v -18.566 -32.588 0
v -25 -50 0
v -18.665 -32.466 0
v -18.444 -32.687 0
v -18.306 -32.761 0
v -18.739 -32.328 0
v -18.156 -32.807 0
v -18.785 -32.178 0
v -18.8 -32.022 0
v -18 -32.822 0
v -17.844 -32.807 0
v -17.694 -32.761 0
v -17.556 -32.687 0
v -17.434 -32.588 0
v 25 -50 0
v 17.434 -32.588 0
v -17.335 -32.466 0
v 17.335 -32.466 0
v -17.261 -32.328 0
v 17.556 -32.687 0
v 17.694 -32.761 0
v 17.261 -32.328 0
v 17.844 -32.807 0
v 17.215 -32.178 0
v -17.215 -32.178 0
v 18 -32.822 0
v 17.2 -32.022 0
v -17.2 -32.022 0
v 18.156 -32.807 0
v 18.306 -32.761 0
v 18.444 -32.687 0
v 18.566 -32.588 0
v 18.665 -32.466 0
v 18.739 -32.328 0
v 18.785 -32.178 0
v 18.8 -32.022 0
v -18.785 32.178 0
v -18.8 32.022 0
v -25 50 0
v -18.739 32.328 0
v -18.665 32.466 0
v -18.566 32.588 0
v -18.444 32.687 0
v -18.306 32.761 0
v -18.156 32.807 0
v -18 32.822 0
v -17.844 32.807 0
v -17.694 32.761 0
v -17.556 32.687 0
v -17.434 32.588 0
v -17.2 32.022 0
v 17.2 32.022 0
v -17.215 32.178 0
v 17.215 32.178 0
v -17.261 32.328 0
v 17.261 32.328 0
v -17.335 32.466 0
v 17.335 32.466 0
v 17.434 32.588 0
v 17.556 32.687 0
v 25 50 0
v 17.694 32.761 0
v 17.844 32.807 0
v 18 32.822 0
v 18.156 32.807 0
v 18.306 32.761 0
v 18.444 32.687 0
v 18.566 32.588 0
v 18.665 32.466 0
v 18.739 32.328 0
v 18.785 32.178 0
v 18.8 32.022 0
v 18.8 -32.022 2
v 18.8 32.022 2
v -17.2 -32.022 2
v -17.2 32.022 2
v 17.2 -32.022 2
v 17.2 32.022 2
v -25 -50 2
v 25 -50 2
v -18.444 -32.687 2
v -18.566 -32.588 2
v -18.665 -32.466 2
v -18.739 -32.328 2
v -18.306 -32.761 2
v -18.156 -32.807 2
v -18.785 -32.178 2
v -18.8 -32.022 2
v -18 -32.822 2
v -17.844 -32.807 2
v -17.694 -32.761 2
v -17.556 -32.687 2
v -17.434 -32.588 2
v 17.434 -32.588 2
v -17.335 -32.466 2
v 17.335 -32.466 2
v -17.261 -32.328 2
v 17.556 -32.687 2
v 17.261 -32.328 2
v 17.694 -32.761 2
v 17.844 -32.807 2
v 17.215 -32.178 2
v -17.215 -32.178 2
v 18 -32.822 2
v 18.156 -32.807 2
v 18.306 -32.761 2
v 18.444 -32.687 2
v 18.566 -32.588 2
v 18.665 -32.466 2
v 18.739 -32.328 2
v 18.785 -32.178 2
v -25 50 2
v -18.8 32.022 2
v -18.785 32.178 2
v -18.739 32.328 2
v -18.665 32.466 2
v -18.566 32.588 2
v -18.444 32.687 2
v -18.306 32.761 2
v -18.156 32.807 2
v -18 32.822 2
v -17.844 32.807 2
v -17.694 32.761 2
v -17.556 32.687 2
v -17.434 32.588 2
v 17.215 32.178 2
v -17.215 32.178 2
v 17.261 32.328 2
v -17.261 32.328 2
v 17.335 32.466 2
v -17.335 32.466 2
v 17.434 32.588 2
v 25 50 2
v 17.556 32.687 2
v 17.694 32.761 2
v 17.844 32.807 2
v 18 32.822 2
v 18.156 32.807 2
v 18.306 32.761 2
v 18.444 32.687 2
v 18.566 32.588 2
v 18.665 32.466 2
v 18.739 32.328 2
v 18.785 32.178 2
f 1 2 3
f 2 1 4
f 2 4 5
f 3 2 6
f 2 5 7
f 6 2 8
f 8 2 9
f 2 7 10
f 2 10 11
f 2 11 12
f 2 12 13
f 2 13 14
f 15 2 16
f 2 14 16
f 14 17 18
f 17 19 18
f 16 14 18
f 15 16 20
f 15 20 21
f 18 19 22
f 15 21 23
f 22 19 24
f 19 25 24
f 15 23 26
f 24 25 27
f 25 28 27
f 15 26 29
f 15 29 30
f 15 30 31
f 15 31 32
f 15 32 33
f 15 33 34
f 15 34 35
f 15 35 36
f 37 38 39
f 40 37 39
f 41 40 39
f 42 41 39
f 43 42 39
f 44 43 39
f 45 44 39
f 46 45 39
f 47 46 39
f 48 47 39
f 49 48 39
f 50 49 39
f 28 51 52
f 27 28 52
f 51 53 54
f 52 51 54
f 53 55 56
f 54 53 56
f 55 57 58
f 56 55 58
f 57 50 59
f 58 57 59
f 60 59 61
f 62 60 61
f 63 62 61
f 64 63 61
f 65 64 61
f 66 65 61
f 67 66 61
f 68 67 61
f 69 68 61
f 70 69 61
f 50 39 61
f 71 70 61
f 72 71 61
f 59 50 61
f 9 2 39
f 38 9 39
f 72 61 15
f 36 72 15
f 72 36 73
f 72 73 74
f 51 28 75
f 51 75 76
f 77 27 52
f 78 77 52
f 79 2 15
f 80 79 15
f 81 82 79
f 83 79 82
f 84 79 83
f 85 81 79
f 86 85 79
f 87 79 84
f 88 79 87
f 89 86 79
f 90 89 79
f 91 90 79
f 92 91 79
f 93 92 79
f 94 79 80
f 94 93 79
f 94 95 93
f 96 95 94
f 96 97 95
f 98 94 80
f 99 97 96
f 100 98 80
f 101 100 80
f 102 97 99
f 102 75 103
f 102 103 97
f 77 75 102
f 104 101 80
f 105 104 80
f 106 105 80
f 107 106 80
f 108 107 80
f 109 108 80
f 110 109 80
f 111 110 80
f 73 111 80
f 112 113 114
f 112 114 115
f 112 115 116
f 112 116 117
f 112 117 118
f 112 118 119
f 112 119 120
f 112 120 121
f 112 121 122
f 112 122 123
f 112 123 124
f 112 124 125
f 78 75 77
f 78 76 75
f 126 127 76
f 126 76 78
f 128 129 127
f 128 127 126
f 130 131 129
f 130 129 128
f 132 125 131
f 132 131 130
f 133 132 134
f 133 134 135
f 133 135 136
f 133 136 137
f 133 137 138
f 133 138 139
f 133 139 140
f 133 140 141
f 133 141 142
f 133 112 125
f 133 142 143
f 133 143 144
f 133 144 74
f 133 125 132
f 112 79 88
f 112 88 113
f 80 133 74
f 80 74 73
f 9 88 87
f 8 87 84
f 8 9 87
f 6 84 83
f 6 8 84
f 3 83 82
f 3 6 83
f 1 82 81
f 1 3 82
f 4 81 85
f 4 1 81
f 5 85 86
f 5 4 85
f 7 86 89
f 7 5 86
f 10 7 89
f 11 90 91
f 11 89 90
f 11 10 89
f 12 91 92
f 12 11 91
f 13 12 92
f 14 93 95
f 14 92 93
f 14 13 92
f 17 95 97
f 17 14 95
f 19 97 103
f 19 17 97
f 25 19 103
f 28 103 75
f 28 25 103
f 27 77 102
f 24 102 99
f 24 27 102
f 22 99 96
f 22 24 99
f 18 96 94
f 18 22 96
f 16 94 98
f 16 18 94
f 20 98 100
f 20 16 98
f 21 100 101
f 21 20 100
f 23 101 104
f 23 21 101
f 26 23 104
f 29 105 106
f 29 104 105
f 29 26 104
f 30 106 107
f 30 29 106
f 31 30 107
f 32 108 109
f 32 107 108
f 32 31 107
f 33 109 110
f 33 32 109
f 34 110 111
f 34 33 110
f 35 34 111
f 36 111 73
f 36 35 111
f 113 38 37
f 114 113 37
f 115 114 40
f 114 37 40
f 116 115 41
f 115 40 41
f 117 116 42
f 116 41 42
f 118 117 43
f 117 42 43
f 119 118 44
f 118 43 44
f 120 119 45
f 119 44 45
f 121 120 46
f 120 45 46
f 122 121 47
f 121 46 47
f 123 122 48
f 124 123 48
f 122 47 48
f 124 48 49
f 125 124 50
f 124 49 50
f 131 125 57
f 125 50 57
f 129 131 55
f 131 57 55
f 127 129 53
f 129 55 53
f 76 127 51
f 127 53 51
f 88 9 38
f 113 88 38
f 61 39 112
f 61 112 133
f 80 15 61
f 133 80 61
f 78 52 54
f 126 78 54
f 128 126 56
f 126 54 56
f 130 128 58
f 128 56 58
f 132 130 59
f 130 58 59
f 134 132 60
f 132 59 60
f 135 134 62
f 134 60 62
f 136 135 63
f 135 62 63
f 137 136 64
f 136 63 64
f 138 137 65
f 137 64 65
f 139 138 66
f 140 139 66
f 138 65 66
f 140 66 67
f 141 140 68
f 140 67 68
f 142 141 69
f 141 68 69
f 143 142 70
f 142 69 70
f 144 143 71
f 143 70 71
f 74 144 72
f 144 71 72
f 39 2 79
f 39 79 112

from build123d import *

# Parameters (mm, degrees)
SKETCH1_W            = 50
SKETCH1_H            = 100
BOSS_EXTRUDE1_DEPTH  = 2
CUT_EXTRUDE1_DEPTH   = 56.937465084
LPATTERN1_COUNT      = 2
LPATTERN1_PITCH      = 36
MIRROR1_COPY_1_DEPTH = 56.937465084


with BuildPart() as part:
    # Sketch1 → Boss-Extrude1 (new body)
    with BuildSketch(Plane.XY):
        Rectangle(SKETCH1_W, SKETCH1_H)
    extrude(amount=BOSS_EXTRUDE1_DEPTH)

    # Sketch2 → Cut-Extrude1 (cut, through all)
    with BuildSketch(Plane(origin=(0, 0, 0), x_dir=(-1, 0, 0), z_dir=(0, 0, -1))):
        with BuildLine():
            Line((-18.8, 0), (-17.2, 0))
            Line((-17.2, 0), (-17.2, 32.021950636))
            ThreePointArc((-17.2, 32.021950636), (-18, 32.821950636), (-18.8, 32.021950636))
            Line((-18.8, 32.021950636), (-18.8, 0))
        make_face()
    cut_extrude1 = extrude(amount=-CUT_EXTRUDE1_DEPTH, mode=Mode.SUBTRACT)

    # LPattern1: Cut-Extrude1 ×2
    with Locations(*[(-i * LPATTERN1_PITCH, 0, 0) for i in range(1, LPATTERN1_COUNT)]):
        add(cut_extrude1, mode=Mode.SUBTRACT)

    # Mirror1: Cut-Extrude1 across plane
    add(cut_extrude1.mirror(Plane.ZX), mode=Mode.SUBTRACT)

    # Mirror1 copy 1 sketch → Mirror1 copy 1 (cut, through all)
    with BuildSketch(Plane(origin=(-36, 0, 0), x_dir=(-1, 0, 0), z_dir=(0, 0, -1))):
        with BuildLine():
            Line((-18.8, 0), (-17.2, 0))
            Line((-17.2, 0), (-17.2, -32.021950636))
            ThreePointArc((-17.2, -32.021950636), (-18, -32.821950636), (-18.8, -32.021950636))
            Line((-18.8, -32.021950636), (-18.8, 0))
        make_face()
    extrude(amount=-MIRROR1_COPY_1_DEPTH, mode=Mode.SUBTRACT)


solid = part.part
